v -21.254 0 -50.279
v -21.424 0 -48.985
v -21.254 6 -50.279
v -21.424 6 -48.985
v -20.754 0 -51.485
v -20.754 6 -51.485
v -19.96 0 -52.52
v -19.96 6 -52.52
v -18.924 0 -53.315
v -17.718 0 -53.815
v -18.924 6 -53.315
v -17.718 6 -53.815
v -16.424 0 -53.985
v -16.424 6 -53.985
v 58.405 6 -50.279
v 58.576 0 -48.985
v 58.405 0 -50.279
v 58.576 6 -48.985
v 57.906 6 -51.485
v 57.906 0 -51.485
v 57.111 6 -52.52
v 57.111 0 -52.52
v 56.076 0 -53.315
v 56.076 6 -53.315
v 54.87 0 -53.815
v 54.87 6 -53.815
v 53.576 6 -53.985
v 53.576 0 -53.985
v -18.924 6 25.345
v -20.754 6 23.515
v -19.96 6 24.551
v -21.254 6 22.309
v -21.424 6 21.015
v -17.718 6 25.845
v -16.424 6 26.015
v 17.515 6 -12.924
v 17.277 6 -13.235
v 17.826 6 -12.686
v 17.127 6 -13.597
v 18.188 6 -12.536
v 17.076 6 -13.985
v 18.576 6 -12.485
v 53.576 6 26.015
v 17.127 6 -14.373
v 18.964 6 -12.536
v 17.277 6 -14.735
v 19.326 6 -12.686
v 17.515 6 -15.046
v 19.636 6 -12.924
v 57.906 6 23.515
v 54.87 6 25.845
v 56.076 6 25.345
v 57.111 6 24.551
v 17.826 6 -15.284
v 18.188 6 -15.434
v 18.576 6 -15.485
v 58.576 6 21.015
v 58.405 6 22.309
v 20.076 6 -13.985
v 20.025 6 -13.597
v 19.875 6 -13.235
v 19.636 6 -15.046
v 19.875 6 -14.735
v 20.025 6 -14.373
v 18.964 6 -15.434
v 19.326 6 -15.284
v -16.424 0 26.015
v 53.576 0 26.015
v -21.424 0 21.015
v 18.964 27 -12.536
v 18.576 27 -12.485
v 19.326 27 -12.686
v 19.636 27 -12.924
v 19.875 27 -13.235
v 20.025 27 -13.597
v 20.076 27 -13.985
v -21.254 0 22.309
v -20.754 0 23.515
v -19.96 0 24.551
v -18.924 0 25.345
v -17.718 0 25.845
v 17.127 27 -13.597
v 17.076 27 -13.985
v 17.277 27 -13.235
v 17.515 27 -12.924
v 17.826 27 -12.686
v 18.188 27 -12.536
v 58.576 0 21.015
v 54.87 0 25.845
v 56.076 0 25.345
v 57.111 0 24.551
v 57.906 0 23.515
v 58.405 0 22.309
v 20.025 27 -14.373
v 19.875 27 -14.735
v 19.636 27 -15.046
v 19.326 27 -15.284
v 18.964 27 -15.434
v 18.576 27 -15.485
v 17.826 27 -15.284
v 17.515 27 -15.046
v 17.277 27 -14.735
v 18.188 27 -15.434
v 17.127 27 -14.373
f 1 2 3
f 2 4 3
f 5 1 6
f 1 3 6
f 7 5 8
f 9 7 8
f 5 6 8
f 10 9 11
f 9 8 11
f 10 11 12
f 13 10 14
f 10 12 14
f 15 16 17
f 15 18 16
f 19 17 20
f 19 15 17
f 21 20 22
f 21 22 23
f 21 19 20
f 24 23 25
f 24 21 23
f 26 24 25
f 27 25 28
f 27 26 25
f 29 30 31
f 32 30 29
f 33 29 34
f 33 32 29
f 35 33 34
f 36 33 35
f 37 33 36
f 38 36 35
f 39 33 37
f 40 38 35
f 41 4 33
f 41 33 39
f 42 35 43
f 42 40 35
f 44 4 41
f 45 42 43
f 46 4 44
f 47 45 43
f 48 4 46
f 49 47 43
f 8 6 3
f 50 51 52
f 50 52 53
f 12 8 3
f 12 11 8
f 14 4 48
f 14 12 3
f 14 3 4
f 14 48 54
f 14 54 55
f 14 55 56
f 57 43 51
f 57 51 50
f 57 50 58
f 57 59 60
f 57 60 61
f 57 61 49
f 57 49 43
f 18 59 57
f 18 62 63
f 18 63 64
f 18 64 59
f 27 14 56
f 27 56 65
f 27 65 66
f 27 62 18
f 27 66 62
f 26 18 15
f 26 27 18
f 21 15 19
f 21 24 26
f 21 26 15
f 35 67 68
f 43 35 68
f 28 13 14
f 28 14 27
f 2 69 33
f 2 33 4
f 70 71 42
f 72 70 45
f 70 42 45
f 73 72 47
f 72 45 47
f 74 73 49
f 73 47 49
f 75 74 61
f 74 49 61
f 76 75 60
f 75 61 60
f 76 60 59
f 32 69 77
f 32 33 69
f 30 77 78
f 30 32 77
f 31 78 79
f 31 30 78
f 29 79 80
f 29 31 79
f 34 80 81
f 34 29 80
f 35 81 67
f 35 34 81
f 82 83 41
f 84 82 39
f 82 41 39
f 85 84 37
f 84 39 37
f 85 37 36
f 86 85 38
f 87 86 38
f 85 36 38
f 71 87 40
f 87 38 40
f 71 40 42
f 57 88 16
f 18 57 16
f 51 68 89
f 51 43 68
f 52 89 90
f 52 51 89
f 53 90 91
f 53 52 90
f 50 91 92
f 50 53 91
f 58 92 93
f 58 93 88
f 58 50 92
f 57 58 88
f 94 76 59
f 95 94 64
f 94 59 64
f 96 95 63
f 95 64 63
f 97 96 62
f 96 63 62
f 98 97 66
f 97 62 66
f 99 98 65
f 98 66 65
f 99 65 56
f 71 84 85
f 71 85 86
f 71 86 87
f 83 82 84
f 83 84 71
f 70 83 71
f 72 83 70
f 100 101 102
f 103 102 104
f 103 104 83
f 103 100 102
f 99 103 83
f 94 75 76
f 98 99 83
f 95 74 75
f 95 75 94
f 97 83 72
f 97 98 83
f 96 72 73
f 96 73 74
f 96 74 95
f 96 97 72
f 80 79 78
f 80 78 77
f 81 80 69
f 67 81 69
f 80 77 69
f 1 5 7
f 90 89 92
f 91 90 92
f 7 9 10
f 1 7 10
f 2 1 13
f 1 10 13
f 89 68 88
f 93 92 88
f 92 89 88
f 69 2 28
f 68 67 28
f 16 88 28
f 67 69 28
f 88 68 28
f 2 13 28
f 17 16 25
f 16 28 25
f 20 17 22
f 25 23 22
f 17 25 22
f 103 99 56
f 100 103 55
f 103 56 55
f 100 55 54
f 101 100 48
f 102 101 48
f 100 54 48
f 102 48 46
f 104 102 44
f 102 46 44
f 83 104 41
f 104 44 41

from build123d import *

# Parameters (mm, degrees)
SKETCH1_W                = 80
SKETCH1_H                = 80
BOSS_EXTRUDE1_DEPTH      = 6
FILLET1_R                = 5
BOSS_EXTRUDE2_DEPTH      = 21
BOSS_EXTRUDE2_DEPTH_BACK = 3


with BuildPart() as part:
    # Sketch1 → Boss-Extrude1 (new body)
    with BuildSketch(Plane(origin=(0, 0, 0), x_dir=(1, 0, 0), z_dir=(0, 1, 0))):
        with Locations((18.575784079, 13.984880667)):
            Rectangle(SKETCH1_W, SKETCH1_H)
    extrude(amount=BOSS_EXTRUDE1_DEPTH)

    # Fillet1
    fillet1_edges = [part.edges().sort_by_distance(p)[0] for p in [
        (-21.424215921, 3, -53.984880667),
        (58.575784079, 3, -53.984880667),
        (58.575784079, 3, 26.015119333),
        (-21.424215921, 3, 26.015119333),
    ]]
    fillet(fillet1_edges, radius=FILLET1_R)

    # Sketch3 → Boss-Extrude2 (add, two sides: drawn at the far end of the back side and taken through both)
    with BuildSketch(Plane(origin=(0, 6, 0), x_dir=(1, 0, 0), z_dir=(0, 1, 0)).offset(-BOSS_EXTRUDE2_DEPTH_BACK)):
        with BuildLine():
            ThreePointArc((20.075784079, 13.984880667), (19.63644425, 15.045540839), (18.575784079, 15.484880667))
            Line((18.575784079, 15.484880667), (18.575784079, 13.984880667))
            Line((18.575784079, 13.984880667), (20.075784079, 13.984880667))
        make_face()
        with BuildLine():
            Line((18.575784079, 13.984880667), (18.575784079, 15.484880667))
            ThreePointArc((18.575784079, 15.484880667), (17.515123907, 15.045540839), (17.075784079, 13.984880667))
            Line((17.075784079, 13.984880667), (18.575784079, 13.984880667))
        make_face()
        with BuildLine():
            Line((20.075784079, 13.984880667), (18.575784079, 13.984880667))
            Line((18.575784079, 13.984880667), (18.575784079, 12.484880667))
            ThreePointArc((18.575784079, 12.484880667), (19.63644425, 12.924220495), (20.075784079, 13.984880667))
        make_face()
        with BuildLine():
            Line((18.575784079, 12.484880667), (18.575784079, 13.984880667))
            Line((18.575784079, 13.984880667), (17.075784079, 13.984880667))
            ThreePointArc((17.075784079, 13.984880667), (17.515123907, 12.924220495), (18.575784079, 12.484880667))
        make_face()
    extrude(amount=BOSS_EXTRUDE2_DEPTH + BOSS_EXTRUDE2_DEPTH_BACK)


solid = part.part
